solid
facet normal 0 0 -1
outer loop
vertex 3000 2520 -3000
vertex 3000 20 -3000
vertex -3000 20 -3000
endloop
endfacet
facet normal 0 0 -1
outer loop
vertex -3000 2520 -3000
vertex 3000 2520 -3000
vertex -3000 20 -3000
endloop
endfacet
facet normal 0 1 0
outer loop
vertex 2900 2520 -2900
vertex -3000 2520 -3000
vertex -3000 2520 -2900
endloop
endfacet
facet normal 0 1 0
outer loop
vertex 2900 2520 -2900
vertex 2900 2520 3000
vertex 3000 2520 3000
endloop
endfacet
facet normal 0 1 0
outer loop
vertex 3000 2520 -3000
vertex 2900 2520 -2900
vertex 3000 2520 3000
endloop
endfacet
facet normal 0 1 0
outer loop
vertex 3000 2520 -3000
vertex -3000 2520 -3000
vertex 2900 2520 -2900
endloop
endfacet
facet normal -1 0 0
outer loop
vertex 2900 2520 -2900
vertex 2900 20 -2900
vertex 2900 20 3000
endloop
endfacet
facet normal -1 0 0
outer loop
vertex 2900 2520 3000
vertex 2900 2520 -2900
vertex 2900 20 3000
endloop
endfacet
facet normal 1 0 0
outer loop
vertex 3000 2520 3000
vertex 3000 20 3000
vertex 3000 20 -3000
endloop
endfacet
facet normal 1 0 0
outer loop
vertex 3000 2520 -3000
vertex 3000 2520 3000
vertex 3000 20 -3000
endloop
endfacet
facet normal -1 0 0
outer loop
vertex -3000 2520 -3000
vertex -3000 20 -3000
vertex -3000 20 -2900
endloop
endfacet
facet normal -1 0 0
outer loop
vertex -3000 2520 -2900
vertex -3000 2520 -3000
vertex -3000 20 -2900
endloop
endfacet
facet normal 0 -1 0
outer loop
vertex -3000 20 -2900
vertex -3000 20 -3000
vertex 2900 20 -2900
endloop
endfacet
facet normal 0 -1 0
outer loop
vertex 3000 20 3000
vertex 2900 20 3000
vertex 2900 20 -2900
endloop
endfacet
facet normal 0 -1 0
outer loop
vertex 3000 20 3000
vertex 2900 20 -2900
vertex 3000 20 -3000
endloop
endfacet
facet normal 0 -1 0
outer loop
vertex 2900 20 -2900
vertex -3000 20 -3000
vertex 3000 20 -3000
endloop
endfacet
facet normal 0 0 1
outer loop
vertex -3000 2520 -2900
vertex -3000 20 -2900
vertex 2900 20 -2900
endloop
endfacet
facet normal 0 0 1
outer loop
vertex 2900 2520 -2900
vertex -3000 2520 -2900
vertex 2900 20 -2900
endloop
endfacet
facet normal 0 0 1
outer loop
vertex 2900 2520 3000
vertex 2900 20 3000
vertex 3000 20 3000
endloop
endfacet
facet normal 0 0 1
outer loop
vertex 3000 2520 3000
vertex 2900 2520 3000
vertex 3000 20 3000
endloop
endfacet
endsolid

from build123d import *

# Parameters (mm, degrees)
CROQUIS1_W     = 6000
CROQUIS1_H     = 6000
EXTRUIR1_DEPTH = 20
EXTRUIR2_DEPTH = 2500


with BuildPart() as part:
    # Croquis1 → Extruir1 (new body)
    with BuildSketch(Plane(origin=(0, 0, 0), x_dir=(1, 0, 0), z_dir=(0, 1, 0))):
        Rectangle(CROQUIS1_W, CROQUIS1_H)
    extrude(amount=EXTRUIR1_DEPTH)


with BuildPart() as body_2:
    # Croquis2 → Extruir2 (new body)
    with BuildSketch(Plane(origin=(0, 20, 0), x_dir=(1, 0, 0), z_dir=(0, 1, 0))):
        Polygon((3000, 3000), (-3000, 3000), (-3000, 2900), (2900, 2900), (2900, -3000), (3000, -3000), align=None)
    extrude(amount=EXTRUIR2_DEPTH)


solid = body_2.part
